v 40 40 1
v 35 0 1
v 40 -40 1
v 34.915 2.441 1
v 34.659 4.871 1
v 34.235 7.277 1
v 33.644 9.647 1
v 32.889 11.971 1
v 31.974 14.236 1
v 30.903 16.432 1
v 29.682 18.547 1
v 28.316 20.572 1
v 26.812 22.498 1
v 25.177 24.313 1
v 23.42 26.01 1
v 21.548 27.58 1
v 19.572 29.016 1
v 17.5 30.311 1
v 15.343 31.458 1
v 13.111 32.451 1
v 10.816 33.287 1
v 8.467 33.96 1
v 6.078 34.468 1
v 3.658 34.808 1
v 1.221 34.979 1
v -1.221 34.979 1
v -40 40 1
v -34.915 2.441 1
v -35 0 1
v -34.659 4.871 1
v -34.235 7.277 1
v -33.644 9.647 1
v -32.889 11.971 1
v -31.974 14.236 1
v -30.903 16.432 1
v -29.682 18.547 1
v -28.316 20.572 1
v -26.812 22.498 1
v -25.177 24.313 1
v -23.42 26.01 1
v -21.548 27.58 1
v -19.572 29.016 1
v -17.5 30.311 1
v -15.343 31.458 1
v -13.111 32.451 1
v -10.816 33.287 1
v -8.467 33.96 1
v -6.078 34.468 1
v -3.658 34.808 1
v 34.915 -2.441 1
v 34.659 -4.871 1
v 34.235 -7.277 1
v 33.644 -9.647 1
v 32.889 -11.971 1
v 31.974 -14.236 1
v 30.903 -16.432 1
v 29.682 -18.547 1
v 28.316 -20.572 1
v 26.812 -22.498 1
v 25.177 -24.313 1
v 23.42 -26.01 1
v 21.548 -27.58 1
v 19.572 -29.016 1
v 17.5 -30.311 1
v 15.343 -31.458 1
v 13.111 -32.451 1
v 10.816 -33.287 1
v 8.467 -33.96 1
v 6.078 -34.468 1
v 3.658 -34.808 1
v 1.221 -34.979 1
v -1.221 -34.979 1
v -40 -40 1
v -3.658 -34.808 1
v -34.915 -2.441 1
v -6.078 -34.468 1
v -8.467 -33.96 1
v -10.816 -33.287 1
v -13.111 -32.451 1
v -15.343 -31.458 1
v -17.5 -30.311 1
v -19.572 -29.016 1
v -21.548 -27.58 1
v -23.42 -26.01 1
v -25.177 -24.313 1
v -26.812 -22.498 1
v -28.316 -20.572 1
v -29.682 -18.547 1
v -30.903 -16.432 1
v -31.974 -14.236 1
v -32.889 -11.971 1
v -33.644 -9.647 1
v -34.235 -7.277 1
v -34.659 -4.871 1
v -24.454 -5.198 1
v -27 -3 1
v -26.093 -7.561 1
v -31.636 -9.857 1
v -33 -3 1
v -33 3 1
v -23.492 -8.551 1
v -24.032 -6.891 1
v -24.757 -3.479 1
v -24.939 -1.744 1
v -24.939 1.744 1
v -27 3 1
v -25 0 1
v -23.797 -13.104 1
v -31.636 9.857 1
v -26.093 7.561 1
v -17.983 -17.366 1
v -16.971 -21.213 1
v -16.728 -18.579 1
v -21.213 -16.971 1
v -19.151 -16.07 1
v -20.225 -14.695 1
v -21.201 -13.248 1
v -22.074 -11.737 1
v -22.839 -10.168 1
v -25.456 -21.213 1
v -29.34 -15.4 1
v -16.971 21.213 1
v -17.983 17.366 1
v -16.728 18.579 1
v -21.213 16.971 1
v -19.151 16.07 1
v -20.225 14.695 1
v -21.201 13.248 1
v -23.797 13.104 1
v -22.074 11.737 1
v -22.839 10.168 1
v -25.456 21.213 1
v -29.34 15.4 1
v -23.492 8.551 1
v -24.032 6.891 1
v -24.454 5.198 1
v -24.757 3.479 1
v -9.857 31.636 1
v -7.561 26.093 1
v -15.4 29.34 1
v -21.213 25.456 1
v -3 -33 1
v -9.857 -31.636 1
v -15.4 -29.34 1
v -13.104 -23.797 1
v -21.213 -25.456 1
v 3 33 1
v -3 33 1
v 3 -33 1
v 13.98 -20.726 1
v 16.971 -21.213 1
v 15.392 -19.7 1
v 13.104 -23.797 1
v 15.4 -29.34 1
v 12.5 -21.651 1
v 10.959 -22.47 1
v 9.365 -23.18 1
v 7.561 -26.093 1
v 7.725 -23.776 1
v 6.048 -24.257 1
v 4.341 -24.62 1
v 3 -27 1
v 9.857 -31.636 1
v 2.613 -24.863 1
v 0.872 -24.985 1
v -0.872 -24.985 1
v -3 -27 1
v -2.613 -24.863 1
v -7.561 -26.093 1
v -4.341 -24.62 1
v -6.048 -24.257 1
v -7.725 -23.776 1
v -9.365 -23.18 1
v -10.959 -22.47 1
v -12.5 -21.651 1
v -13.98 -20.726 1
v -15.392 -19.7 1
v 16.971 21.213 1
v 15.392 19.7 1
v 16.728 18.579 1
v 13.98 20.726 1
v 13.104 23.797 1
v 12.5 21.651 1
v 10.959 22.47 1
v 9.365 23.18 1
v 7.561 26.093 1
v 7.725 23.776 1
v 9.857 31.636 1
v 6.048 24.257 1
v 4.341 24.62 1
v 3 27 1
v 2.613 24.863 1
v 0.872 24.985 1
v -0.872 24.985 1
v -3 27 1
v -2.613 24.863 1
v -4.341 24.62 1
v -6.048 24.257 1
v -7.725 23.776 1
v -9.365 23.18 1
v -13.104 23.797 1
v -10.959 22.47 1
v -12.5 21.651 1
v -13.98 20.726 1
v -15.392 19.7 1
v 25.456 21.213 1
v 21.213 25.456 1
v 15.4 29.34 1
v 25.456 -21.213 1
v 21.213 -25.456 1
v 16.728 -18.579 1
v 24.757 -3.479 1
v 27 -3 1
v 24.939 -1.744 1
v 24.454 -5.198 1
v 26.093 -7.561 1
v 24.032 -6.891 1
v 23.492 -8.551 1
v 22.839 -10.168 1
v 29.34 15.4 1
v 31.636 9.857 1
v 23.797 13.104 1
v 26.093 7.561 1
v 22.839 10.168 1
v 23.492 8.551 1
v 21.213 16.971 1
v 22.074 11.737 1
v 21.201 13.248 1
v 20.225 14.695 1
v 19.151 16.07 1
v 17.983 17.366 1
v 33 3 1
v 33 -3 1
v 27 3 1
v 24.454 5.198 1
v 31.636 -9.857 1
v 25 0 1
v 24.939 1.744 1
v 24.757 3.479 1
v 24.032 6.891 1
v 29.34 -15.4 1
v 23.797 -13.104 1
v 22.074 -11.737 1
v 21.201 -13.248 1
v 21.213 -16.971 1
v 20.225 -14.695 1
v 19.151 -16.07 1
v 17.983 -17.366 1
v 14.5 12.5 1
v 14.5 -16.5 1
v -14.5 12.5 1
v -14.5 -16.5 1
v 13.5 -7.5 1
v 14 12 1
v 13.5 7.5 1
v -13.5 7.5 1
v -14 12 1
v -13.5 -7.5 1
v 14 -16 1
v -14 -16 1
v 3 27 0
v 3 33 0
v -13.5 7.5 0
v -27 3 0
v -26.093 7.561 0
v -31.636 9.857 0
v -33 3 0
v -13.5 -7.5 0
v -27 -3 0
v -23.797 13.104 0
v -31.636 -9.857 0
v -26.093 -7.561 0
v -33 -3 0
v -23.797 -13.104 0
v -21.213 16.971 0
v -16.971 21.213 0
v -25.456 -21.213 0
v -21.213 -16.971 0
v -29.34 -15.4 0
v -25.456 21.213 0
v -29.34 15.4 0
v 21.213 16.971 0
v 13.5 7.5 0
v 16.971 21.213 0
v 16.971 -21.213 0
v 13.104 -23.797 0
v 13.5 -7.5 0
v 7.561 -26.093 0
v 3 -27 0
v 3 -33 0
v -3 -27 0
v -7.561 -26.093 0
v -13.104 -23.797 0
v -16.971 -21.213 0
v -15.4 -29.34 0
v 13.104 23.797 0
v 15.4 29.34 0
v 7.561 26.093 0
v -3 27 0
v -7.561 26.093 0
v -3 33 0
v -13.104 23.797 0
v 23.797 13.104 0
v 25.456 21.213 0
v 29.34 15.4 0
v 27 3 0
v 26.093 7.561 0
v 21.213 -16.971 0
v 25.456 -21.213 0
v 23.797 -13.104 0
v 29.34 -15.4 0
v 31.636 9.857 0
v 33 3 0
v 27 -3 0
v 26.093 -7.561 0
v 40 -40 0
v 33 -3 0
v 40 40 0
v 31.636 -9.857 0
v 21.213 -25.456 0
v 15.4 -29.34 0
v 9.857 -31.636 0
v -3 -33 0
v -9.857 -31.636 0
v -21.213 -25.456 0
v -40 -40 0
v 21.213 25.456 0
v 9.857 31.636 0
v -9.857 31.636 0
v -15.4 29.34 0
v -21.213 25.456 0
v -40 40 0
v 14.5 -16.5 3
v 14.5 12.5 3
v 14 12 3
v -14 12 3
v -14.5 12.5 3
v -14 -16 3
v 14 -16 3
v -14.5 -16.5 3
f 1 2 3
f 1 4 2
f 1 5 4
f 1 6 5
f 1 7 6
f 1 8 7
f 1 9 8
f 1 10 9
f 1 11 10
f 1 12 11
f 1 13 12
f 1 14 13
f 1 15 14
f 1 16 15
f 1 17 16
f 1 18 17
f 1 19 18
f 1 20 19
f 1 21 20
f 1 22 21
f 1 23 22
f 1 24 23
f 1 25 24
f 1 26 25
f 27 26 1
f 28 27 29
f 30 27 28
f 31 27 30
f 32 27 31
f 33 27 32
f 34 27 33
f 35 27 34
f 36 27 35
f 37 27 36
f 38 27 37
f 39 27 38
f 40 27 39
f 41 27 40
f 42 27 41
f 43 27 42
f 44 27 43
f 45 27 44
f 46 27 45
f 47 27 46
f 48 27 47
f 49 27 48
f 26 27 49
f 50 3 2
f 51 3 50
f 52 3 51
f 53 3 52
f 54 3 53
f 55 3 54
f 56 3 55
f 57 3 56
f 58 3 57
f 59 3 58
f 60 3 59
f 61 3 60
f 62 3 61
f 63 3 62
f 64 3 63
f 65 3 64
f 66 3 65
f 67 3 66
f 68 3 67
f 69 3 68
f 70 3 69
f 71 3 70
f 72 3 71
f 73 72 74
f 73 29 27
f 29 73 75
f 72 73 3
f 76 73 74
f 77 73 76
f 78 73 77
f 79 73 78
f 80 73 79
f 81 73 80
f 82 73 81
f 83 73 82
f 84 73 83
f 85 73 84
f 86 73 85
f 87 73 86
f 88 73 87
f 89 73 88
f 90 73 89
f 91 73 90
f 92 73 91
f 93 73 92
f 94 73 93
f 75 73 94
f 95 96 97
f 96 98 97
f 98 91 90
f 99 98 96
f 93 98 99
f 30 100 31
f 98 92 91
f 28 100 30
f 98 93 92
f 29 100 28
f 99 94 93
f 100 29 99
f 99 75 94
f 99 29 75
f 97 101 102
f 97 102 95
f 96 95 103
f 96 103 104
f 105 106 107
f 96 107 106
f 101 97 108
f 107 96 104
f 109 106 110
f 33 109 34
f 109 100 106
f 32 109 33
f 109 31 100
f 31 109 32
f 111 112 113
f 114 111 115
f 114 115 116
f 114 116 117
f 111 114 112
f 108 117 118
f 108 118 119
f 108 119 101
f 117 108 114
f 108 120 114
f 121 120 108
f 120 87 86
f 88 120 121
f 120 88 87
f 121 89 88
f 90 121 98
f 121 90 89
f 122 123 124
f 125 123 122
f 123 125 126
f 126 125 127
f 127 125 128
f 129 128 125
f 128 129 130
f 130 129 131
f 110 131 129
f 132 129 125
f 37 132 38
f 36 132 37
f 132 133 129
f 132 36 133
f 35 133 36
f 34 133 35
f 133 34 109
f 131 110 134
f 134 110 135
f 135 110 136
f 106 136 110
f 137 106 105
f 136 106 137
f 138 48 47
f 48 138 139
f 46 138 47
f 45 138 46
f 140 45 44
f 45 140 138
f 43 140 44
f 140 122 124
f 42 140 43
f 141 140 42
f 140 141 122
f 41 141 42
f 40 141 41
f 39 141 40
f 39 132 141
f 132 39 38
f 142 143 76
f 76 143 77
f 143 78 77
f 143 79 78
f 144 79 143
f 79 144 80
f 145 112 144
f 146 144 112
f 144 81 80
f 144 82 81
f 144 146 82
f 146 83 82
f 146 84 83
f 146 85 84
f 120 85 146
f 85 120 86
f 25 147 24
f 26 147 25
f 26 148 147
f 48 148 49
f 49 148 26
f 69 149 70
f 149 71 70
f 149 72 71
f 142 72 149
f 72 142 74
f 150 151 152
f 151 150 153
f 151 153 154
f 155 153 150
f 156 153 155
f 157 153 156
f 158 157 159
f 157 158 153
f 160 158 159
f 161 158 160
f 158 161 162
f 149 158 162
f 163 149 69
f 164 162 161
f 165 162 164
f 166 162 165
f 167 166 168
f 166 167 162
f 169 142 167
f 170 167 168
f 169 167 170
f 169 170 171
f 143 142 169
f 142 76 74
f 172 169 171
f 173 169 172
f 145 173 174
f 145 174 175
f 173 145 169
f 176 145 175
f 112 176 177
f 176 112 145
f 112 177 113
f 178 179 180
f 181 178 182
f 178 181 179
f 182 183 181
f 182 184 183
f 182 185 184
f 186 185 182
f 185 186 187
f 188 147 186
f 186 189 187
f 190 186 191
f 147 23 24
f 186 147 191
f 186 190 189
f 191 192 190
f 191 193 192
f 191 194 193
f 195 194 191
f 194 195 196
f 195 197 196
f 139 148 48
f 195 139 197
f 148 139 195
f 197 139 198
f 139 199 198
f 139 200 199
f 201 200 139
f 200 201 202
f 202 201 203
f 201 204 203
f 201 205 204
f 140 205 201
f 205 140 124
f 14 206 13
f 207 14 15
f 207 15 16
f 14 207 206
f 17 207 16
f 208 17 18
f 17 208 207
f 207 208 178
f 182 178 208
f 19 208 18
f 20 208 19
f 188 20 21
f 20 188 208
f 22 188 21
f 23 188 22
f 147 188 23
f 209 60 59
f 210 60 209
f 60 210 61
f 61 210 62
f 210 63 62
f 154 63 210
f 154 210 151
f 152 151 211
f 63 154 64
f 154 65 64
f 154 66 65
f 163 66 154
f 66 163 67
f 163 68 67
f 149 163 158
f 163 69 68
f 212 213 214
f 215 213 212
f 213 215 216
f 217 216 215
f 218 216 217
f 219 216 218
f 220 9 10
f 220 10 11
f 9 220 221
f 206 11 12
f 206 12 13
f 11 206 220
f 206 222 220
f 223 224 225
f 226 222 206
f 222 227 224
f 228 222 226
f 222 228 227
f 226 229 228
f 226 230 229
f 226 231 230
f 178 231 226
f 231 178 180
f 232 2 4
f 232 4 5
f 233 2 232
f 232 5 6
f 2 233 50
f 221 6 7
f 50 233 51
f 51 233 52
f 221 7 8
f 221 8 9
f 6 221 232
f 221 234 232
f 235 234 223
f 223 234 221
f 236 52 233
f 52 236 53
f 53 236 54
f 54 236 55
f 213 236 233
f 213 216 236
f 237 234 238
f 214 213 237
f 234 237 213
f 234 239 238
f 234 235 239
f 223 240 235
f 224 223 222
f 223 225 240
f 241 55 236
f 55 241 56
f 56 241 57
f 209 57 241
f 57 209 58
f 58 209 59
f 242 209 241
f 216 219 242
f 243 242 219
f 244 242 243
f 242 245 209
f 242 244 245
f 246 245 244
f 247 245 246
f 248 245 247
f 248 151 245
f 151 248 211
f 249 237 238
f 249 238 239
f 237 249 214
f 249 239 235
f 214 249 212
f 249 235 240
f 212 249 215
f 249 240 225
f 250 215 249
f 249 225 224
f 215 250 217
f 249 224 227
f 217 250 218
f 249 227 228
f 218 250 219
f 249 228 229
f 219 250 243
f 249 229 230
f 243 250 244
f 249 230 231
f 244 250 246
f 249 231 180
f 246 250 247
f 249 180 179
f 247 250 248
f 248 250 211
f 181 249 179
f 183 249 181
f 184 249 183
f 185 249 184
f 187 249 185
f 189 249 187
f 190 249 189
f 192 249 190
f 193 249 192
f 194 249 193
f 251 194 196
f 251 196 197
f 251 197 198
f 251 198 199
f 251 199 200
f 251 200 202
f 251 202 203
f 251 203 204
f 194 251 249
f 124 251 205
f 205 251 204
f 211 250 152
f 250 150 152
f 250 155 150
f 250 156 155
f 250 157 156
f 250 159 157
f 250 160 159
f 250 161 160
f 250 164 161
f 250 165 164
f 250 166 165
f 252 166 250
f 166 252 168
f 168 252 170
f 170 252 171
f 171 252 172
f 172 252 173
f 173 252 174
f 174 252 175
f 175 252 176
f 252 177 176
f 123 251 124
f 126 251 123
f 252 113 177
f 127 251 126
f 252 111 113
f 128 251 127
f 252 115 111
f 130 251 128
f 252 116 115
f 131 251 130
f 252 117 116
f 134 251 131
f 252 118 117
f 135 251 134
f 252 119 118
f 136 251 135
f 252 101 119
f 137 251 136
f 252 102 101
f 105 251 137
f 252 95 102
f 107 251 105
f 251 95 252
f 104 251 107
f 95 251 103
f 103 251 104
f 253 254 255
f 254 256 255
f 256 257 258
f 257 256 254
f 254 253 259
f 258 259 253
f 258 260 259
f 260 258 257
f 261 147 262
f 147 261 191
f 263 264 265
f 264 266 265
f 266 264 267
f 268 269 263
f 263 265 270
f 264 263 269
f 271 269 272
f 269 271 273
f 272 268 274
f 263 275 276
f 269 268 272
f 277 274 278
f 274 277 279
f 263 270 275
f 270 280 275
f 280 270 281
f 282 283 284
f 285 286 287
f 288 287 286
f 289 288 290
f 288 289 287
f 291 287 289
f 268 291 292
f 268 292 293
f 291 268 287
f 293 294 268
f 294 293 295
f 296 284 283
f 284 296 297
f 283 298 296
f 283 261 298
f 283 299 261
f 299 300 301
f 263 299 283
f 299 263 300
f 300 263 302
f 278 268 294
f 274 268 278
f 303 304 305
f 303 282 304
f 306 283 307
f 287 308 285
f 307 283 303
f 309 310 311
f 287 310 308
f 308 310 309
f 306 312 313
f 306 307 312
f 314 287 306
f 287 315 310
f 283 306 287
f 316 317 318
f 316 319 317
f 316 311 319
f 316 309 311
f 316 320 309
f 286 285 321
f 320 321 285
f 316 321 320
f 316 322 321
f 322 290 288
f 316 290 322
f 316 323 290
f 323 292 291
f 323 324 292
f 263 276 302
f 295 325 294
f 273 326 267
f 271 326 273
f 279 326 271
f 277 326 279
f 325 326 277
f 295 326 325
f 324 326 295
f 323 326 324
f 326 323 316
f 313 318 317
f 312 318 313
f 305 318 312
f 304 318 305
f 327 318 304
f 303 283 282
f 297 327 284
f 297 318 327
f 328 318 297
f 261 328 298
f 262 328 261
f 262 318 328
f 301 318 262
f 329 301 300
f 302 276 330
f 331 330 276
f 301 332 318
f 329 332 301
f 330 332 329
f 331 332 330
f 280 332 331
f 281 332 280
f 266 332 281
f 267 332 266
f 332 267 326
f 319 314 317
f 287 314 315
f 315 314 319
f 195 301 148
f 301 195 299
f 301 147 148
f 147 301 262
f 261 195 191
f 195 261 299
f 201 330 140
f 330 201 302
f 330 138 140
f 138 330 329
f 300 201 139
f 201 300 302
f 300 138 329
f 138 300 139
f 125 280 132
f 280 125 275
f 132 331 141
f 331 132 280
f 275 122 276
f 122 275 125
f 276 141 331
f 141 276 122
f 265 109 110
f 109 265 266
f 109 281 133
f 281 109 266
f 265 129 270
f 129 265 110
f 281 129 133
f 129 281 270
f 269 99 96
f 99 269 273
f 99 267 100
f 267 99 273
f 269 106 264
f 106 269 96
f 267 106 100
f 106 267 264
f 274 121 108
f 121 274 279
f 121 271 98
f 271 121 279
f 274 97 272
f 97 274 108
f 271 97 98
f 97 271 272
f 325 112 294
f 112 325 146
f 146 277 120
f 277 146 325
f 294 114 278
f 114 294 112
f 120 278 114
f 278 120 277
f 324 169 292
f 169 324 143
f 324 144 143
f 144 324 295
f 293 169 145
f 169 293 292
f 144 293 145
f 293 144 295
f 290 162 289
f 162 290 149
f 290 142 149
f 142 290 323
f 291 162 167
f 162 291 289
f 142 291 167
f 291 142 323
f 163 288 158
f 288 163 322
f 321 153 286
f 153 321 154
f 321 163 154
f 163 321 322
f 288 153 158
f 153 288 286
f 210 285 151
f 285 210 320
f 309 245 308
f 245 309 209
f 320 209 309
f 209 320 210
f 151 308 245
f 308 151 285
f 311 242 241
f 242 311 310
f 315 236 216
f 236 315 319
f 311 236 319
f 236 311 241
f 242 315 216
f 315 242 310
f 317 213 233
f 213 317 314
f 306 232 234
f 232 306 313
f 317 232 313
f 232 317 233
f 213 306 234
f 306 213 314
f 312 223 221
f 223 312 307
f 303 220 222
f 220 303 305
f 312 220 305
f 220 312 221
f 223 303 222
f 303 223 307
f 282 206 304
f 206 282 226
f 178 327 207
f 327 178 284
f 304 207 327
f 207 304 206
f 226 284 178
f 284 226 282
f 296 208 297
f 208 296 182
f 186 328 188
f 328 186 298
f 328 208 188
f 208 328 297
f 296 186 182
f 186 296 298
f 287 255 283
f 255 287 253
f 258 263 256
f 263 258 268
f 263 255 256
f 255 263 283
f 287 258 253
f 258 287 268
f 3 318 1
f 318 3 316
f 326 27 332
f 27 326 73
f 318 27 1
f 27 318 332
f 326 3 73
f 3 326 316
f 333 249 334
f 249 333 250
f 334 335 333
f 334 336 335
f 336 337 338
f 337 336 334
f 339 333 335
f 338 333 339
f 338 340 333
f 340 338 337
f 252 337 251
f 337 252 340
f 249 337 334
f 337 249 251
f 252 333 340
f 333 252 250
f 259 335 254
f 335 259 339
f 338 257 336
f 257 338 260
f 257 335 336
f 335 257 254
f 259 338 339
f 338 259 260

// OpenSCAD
numberLed = 16;
circleRadius = 30;
ledHeight = 1;
ledLength = 6;
ringHeight = 2;

displayLength = 15;
displayWidth = 27;
displayHeight = 2;
displayPCBLength = 28;
displayPCBWidth = 28;
displayPCBHeight = 1;

$fn = 90;

module ring()
{
    translate([0, 0, ledHeight]) difference()
    {
        cylinder(h = ringHeight, r = circleRadius+ledLength/2+2);
        cylinder(h = ringHeight, r = circleRadius-ledLength/2-2);
    }

    for (i = [0:360/numberLed:360]) 
        rotate([0, 0, i]) translate([0, circleRadius, ledHeight/2]) cube([ledLength, ledLength, ledHeight], true);
}

module display()
{
    union()
    {
        translate([0, 0, displayHeight/2]) cube([displayWidth, displayLength, displayHeight], true);
        translate([0, -2, displayHeight/2+displayPCBHeight/2]) cube([displayPCBWidth, displayPCBLength, displayPCBHeight], true);
    }
}

module displayHolder()
{
    difference()
    {
        translate([0, -2, displayHeight/2+displayPCBHeight/2]) cube([displayPCBWidth+1, displayPCBLength+1, displayPCBHeight*3], true);
        translate([0, -2, displayHeight/2+displayPCBHeight/2]) cube([displayPCBWidth, displayPCBLength, displayPCBHeight*3], true);
    }
}

height = 1;

difference()
{
    translate([0, 0, height/2]) cube([80, 80, height], true);
    ring();
    display();
}

displayHolder();
